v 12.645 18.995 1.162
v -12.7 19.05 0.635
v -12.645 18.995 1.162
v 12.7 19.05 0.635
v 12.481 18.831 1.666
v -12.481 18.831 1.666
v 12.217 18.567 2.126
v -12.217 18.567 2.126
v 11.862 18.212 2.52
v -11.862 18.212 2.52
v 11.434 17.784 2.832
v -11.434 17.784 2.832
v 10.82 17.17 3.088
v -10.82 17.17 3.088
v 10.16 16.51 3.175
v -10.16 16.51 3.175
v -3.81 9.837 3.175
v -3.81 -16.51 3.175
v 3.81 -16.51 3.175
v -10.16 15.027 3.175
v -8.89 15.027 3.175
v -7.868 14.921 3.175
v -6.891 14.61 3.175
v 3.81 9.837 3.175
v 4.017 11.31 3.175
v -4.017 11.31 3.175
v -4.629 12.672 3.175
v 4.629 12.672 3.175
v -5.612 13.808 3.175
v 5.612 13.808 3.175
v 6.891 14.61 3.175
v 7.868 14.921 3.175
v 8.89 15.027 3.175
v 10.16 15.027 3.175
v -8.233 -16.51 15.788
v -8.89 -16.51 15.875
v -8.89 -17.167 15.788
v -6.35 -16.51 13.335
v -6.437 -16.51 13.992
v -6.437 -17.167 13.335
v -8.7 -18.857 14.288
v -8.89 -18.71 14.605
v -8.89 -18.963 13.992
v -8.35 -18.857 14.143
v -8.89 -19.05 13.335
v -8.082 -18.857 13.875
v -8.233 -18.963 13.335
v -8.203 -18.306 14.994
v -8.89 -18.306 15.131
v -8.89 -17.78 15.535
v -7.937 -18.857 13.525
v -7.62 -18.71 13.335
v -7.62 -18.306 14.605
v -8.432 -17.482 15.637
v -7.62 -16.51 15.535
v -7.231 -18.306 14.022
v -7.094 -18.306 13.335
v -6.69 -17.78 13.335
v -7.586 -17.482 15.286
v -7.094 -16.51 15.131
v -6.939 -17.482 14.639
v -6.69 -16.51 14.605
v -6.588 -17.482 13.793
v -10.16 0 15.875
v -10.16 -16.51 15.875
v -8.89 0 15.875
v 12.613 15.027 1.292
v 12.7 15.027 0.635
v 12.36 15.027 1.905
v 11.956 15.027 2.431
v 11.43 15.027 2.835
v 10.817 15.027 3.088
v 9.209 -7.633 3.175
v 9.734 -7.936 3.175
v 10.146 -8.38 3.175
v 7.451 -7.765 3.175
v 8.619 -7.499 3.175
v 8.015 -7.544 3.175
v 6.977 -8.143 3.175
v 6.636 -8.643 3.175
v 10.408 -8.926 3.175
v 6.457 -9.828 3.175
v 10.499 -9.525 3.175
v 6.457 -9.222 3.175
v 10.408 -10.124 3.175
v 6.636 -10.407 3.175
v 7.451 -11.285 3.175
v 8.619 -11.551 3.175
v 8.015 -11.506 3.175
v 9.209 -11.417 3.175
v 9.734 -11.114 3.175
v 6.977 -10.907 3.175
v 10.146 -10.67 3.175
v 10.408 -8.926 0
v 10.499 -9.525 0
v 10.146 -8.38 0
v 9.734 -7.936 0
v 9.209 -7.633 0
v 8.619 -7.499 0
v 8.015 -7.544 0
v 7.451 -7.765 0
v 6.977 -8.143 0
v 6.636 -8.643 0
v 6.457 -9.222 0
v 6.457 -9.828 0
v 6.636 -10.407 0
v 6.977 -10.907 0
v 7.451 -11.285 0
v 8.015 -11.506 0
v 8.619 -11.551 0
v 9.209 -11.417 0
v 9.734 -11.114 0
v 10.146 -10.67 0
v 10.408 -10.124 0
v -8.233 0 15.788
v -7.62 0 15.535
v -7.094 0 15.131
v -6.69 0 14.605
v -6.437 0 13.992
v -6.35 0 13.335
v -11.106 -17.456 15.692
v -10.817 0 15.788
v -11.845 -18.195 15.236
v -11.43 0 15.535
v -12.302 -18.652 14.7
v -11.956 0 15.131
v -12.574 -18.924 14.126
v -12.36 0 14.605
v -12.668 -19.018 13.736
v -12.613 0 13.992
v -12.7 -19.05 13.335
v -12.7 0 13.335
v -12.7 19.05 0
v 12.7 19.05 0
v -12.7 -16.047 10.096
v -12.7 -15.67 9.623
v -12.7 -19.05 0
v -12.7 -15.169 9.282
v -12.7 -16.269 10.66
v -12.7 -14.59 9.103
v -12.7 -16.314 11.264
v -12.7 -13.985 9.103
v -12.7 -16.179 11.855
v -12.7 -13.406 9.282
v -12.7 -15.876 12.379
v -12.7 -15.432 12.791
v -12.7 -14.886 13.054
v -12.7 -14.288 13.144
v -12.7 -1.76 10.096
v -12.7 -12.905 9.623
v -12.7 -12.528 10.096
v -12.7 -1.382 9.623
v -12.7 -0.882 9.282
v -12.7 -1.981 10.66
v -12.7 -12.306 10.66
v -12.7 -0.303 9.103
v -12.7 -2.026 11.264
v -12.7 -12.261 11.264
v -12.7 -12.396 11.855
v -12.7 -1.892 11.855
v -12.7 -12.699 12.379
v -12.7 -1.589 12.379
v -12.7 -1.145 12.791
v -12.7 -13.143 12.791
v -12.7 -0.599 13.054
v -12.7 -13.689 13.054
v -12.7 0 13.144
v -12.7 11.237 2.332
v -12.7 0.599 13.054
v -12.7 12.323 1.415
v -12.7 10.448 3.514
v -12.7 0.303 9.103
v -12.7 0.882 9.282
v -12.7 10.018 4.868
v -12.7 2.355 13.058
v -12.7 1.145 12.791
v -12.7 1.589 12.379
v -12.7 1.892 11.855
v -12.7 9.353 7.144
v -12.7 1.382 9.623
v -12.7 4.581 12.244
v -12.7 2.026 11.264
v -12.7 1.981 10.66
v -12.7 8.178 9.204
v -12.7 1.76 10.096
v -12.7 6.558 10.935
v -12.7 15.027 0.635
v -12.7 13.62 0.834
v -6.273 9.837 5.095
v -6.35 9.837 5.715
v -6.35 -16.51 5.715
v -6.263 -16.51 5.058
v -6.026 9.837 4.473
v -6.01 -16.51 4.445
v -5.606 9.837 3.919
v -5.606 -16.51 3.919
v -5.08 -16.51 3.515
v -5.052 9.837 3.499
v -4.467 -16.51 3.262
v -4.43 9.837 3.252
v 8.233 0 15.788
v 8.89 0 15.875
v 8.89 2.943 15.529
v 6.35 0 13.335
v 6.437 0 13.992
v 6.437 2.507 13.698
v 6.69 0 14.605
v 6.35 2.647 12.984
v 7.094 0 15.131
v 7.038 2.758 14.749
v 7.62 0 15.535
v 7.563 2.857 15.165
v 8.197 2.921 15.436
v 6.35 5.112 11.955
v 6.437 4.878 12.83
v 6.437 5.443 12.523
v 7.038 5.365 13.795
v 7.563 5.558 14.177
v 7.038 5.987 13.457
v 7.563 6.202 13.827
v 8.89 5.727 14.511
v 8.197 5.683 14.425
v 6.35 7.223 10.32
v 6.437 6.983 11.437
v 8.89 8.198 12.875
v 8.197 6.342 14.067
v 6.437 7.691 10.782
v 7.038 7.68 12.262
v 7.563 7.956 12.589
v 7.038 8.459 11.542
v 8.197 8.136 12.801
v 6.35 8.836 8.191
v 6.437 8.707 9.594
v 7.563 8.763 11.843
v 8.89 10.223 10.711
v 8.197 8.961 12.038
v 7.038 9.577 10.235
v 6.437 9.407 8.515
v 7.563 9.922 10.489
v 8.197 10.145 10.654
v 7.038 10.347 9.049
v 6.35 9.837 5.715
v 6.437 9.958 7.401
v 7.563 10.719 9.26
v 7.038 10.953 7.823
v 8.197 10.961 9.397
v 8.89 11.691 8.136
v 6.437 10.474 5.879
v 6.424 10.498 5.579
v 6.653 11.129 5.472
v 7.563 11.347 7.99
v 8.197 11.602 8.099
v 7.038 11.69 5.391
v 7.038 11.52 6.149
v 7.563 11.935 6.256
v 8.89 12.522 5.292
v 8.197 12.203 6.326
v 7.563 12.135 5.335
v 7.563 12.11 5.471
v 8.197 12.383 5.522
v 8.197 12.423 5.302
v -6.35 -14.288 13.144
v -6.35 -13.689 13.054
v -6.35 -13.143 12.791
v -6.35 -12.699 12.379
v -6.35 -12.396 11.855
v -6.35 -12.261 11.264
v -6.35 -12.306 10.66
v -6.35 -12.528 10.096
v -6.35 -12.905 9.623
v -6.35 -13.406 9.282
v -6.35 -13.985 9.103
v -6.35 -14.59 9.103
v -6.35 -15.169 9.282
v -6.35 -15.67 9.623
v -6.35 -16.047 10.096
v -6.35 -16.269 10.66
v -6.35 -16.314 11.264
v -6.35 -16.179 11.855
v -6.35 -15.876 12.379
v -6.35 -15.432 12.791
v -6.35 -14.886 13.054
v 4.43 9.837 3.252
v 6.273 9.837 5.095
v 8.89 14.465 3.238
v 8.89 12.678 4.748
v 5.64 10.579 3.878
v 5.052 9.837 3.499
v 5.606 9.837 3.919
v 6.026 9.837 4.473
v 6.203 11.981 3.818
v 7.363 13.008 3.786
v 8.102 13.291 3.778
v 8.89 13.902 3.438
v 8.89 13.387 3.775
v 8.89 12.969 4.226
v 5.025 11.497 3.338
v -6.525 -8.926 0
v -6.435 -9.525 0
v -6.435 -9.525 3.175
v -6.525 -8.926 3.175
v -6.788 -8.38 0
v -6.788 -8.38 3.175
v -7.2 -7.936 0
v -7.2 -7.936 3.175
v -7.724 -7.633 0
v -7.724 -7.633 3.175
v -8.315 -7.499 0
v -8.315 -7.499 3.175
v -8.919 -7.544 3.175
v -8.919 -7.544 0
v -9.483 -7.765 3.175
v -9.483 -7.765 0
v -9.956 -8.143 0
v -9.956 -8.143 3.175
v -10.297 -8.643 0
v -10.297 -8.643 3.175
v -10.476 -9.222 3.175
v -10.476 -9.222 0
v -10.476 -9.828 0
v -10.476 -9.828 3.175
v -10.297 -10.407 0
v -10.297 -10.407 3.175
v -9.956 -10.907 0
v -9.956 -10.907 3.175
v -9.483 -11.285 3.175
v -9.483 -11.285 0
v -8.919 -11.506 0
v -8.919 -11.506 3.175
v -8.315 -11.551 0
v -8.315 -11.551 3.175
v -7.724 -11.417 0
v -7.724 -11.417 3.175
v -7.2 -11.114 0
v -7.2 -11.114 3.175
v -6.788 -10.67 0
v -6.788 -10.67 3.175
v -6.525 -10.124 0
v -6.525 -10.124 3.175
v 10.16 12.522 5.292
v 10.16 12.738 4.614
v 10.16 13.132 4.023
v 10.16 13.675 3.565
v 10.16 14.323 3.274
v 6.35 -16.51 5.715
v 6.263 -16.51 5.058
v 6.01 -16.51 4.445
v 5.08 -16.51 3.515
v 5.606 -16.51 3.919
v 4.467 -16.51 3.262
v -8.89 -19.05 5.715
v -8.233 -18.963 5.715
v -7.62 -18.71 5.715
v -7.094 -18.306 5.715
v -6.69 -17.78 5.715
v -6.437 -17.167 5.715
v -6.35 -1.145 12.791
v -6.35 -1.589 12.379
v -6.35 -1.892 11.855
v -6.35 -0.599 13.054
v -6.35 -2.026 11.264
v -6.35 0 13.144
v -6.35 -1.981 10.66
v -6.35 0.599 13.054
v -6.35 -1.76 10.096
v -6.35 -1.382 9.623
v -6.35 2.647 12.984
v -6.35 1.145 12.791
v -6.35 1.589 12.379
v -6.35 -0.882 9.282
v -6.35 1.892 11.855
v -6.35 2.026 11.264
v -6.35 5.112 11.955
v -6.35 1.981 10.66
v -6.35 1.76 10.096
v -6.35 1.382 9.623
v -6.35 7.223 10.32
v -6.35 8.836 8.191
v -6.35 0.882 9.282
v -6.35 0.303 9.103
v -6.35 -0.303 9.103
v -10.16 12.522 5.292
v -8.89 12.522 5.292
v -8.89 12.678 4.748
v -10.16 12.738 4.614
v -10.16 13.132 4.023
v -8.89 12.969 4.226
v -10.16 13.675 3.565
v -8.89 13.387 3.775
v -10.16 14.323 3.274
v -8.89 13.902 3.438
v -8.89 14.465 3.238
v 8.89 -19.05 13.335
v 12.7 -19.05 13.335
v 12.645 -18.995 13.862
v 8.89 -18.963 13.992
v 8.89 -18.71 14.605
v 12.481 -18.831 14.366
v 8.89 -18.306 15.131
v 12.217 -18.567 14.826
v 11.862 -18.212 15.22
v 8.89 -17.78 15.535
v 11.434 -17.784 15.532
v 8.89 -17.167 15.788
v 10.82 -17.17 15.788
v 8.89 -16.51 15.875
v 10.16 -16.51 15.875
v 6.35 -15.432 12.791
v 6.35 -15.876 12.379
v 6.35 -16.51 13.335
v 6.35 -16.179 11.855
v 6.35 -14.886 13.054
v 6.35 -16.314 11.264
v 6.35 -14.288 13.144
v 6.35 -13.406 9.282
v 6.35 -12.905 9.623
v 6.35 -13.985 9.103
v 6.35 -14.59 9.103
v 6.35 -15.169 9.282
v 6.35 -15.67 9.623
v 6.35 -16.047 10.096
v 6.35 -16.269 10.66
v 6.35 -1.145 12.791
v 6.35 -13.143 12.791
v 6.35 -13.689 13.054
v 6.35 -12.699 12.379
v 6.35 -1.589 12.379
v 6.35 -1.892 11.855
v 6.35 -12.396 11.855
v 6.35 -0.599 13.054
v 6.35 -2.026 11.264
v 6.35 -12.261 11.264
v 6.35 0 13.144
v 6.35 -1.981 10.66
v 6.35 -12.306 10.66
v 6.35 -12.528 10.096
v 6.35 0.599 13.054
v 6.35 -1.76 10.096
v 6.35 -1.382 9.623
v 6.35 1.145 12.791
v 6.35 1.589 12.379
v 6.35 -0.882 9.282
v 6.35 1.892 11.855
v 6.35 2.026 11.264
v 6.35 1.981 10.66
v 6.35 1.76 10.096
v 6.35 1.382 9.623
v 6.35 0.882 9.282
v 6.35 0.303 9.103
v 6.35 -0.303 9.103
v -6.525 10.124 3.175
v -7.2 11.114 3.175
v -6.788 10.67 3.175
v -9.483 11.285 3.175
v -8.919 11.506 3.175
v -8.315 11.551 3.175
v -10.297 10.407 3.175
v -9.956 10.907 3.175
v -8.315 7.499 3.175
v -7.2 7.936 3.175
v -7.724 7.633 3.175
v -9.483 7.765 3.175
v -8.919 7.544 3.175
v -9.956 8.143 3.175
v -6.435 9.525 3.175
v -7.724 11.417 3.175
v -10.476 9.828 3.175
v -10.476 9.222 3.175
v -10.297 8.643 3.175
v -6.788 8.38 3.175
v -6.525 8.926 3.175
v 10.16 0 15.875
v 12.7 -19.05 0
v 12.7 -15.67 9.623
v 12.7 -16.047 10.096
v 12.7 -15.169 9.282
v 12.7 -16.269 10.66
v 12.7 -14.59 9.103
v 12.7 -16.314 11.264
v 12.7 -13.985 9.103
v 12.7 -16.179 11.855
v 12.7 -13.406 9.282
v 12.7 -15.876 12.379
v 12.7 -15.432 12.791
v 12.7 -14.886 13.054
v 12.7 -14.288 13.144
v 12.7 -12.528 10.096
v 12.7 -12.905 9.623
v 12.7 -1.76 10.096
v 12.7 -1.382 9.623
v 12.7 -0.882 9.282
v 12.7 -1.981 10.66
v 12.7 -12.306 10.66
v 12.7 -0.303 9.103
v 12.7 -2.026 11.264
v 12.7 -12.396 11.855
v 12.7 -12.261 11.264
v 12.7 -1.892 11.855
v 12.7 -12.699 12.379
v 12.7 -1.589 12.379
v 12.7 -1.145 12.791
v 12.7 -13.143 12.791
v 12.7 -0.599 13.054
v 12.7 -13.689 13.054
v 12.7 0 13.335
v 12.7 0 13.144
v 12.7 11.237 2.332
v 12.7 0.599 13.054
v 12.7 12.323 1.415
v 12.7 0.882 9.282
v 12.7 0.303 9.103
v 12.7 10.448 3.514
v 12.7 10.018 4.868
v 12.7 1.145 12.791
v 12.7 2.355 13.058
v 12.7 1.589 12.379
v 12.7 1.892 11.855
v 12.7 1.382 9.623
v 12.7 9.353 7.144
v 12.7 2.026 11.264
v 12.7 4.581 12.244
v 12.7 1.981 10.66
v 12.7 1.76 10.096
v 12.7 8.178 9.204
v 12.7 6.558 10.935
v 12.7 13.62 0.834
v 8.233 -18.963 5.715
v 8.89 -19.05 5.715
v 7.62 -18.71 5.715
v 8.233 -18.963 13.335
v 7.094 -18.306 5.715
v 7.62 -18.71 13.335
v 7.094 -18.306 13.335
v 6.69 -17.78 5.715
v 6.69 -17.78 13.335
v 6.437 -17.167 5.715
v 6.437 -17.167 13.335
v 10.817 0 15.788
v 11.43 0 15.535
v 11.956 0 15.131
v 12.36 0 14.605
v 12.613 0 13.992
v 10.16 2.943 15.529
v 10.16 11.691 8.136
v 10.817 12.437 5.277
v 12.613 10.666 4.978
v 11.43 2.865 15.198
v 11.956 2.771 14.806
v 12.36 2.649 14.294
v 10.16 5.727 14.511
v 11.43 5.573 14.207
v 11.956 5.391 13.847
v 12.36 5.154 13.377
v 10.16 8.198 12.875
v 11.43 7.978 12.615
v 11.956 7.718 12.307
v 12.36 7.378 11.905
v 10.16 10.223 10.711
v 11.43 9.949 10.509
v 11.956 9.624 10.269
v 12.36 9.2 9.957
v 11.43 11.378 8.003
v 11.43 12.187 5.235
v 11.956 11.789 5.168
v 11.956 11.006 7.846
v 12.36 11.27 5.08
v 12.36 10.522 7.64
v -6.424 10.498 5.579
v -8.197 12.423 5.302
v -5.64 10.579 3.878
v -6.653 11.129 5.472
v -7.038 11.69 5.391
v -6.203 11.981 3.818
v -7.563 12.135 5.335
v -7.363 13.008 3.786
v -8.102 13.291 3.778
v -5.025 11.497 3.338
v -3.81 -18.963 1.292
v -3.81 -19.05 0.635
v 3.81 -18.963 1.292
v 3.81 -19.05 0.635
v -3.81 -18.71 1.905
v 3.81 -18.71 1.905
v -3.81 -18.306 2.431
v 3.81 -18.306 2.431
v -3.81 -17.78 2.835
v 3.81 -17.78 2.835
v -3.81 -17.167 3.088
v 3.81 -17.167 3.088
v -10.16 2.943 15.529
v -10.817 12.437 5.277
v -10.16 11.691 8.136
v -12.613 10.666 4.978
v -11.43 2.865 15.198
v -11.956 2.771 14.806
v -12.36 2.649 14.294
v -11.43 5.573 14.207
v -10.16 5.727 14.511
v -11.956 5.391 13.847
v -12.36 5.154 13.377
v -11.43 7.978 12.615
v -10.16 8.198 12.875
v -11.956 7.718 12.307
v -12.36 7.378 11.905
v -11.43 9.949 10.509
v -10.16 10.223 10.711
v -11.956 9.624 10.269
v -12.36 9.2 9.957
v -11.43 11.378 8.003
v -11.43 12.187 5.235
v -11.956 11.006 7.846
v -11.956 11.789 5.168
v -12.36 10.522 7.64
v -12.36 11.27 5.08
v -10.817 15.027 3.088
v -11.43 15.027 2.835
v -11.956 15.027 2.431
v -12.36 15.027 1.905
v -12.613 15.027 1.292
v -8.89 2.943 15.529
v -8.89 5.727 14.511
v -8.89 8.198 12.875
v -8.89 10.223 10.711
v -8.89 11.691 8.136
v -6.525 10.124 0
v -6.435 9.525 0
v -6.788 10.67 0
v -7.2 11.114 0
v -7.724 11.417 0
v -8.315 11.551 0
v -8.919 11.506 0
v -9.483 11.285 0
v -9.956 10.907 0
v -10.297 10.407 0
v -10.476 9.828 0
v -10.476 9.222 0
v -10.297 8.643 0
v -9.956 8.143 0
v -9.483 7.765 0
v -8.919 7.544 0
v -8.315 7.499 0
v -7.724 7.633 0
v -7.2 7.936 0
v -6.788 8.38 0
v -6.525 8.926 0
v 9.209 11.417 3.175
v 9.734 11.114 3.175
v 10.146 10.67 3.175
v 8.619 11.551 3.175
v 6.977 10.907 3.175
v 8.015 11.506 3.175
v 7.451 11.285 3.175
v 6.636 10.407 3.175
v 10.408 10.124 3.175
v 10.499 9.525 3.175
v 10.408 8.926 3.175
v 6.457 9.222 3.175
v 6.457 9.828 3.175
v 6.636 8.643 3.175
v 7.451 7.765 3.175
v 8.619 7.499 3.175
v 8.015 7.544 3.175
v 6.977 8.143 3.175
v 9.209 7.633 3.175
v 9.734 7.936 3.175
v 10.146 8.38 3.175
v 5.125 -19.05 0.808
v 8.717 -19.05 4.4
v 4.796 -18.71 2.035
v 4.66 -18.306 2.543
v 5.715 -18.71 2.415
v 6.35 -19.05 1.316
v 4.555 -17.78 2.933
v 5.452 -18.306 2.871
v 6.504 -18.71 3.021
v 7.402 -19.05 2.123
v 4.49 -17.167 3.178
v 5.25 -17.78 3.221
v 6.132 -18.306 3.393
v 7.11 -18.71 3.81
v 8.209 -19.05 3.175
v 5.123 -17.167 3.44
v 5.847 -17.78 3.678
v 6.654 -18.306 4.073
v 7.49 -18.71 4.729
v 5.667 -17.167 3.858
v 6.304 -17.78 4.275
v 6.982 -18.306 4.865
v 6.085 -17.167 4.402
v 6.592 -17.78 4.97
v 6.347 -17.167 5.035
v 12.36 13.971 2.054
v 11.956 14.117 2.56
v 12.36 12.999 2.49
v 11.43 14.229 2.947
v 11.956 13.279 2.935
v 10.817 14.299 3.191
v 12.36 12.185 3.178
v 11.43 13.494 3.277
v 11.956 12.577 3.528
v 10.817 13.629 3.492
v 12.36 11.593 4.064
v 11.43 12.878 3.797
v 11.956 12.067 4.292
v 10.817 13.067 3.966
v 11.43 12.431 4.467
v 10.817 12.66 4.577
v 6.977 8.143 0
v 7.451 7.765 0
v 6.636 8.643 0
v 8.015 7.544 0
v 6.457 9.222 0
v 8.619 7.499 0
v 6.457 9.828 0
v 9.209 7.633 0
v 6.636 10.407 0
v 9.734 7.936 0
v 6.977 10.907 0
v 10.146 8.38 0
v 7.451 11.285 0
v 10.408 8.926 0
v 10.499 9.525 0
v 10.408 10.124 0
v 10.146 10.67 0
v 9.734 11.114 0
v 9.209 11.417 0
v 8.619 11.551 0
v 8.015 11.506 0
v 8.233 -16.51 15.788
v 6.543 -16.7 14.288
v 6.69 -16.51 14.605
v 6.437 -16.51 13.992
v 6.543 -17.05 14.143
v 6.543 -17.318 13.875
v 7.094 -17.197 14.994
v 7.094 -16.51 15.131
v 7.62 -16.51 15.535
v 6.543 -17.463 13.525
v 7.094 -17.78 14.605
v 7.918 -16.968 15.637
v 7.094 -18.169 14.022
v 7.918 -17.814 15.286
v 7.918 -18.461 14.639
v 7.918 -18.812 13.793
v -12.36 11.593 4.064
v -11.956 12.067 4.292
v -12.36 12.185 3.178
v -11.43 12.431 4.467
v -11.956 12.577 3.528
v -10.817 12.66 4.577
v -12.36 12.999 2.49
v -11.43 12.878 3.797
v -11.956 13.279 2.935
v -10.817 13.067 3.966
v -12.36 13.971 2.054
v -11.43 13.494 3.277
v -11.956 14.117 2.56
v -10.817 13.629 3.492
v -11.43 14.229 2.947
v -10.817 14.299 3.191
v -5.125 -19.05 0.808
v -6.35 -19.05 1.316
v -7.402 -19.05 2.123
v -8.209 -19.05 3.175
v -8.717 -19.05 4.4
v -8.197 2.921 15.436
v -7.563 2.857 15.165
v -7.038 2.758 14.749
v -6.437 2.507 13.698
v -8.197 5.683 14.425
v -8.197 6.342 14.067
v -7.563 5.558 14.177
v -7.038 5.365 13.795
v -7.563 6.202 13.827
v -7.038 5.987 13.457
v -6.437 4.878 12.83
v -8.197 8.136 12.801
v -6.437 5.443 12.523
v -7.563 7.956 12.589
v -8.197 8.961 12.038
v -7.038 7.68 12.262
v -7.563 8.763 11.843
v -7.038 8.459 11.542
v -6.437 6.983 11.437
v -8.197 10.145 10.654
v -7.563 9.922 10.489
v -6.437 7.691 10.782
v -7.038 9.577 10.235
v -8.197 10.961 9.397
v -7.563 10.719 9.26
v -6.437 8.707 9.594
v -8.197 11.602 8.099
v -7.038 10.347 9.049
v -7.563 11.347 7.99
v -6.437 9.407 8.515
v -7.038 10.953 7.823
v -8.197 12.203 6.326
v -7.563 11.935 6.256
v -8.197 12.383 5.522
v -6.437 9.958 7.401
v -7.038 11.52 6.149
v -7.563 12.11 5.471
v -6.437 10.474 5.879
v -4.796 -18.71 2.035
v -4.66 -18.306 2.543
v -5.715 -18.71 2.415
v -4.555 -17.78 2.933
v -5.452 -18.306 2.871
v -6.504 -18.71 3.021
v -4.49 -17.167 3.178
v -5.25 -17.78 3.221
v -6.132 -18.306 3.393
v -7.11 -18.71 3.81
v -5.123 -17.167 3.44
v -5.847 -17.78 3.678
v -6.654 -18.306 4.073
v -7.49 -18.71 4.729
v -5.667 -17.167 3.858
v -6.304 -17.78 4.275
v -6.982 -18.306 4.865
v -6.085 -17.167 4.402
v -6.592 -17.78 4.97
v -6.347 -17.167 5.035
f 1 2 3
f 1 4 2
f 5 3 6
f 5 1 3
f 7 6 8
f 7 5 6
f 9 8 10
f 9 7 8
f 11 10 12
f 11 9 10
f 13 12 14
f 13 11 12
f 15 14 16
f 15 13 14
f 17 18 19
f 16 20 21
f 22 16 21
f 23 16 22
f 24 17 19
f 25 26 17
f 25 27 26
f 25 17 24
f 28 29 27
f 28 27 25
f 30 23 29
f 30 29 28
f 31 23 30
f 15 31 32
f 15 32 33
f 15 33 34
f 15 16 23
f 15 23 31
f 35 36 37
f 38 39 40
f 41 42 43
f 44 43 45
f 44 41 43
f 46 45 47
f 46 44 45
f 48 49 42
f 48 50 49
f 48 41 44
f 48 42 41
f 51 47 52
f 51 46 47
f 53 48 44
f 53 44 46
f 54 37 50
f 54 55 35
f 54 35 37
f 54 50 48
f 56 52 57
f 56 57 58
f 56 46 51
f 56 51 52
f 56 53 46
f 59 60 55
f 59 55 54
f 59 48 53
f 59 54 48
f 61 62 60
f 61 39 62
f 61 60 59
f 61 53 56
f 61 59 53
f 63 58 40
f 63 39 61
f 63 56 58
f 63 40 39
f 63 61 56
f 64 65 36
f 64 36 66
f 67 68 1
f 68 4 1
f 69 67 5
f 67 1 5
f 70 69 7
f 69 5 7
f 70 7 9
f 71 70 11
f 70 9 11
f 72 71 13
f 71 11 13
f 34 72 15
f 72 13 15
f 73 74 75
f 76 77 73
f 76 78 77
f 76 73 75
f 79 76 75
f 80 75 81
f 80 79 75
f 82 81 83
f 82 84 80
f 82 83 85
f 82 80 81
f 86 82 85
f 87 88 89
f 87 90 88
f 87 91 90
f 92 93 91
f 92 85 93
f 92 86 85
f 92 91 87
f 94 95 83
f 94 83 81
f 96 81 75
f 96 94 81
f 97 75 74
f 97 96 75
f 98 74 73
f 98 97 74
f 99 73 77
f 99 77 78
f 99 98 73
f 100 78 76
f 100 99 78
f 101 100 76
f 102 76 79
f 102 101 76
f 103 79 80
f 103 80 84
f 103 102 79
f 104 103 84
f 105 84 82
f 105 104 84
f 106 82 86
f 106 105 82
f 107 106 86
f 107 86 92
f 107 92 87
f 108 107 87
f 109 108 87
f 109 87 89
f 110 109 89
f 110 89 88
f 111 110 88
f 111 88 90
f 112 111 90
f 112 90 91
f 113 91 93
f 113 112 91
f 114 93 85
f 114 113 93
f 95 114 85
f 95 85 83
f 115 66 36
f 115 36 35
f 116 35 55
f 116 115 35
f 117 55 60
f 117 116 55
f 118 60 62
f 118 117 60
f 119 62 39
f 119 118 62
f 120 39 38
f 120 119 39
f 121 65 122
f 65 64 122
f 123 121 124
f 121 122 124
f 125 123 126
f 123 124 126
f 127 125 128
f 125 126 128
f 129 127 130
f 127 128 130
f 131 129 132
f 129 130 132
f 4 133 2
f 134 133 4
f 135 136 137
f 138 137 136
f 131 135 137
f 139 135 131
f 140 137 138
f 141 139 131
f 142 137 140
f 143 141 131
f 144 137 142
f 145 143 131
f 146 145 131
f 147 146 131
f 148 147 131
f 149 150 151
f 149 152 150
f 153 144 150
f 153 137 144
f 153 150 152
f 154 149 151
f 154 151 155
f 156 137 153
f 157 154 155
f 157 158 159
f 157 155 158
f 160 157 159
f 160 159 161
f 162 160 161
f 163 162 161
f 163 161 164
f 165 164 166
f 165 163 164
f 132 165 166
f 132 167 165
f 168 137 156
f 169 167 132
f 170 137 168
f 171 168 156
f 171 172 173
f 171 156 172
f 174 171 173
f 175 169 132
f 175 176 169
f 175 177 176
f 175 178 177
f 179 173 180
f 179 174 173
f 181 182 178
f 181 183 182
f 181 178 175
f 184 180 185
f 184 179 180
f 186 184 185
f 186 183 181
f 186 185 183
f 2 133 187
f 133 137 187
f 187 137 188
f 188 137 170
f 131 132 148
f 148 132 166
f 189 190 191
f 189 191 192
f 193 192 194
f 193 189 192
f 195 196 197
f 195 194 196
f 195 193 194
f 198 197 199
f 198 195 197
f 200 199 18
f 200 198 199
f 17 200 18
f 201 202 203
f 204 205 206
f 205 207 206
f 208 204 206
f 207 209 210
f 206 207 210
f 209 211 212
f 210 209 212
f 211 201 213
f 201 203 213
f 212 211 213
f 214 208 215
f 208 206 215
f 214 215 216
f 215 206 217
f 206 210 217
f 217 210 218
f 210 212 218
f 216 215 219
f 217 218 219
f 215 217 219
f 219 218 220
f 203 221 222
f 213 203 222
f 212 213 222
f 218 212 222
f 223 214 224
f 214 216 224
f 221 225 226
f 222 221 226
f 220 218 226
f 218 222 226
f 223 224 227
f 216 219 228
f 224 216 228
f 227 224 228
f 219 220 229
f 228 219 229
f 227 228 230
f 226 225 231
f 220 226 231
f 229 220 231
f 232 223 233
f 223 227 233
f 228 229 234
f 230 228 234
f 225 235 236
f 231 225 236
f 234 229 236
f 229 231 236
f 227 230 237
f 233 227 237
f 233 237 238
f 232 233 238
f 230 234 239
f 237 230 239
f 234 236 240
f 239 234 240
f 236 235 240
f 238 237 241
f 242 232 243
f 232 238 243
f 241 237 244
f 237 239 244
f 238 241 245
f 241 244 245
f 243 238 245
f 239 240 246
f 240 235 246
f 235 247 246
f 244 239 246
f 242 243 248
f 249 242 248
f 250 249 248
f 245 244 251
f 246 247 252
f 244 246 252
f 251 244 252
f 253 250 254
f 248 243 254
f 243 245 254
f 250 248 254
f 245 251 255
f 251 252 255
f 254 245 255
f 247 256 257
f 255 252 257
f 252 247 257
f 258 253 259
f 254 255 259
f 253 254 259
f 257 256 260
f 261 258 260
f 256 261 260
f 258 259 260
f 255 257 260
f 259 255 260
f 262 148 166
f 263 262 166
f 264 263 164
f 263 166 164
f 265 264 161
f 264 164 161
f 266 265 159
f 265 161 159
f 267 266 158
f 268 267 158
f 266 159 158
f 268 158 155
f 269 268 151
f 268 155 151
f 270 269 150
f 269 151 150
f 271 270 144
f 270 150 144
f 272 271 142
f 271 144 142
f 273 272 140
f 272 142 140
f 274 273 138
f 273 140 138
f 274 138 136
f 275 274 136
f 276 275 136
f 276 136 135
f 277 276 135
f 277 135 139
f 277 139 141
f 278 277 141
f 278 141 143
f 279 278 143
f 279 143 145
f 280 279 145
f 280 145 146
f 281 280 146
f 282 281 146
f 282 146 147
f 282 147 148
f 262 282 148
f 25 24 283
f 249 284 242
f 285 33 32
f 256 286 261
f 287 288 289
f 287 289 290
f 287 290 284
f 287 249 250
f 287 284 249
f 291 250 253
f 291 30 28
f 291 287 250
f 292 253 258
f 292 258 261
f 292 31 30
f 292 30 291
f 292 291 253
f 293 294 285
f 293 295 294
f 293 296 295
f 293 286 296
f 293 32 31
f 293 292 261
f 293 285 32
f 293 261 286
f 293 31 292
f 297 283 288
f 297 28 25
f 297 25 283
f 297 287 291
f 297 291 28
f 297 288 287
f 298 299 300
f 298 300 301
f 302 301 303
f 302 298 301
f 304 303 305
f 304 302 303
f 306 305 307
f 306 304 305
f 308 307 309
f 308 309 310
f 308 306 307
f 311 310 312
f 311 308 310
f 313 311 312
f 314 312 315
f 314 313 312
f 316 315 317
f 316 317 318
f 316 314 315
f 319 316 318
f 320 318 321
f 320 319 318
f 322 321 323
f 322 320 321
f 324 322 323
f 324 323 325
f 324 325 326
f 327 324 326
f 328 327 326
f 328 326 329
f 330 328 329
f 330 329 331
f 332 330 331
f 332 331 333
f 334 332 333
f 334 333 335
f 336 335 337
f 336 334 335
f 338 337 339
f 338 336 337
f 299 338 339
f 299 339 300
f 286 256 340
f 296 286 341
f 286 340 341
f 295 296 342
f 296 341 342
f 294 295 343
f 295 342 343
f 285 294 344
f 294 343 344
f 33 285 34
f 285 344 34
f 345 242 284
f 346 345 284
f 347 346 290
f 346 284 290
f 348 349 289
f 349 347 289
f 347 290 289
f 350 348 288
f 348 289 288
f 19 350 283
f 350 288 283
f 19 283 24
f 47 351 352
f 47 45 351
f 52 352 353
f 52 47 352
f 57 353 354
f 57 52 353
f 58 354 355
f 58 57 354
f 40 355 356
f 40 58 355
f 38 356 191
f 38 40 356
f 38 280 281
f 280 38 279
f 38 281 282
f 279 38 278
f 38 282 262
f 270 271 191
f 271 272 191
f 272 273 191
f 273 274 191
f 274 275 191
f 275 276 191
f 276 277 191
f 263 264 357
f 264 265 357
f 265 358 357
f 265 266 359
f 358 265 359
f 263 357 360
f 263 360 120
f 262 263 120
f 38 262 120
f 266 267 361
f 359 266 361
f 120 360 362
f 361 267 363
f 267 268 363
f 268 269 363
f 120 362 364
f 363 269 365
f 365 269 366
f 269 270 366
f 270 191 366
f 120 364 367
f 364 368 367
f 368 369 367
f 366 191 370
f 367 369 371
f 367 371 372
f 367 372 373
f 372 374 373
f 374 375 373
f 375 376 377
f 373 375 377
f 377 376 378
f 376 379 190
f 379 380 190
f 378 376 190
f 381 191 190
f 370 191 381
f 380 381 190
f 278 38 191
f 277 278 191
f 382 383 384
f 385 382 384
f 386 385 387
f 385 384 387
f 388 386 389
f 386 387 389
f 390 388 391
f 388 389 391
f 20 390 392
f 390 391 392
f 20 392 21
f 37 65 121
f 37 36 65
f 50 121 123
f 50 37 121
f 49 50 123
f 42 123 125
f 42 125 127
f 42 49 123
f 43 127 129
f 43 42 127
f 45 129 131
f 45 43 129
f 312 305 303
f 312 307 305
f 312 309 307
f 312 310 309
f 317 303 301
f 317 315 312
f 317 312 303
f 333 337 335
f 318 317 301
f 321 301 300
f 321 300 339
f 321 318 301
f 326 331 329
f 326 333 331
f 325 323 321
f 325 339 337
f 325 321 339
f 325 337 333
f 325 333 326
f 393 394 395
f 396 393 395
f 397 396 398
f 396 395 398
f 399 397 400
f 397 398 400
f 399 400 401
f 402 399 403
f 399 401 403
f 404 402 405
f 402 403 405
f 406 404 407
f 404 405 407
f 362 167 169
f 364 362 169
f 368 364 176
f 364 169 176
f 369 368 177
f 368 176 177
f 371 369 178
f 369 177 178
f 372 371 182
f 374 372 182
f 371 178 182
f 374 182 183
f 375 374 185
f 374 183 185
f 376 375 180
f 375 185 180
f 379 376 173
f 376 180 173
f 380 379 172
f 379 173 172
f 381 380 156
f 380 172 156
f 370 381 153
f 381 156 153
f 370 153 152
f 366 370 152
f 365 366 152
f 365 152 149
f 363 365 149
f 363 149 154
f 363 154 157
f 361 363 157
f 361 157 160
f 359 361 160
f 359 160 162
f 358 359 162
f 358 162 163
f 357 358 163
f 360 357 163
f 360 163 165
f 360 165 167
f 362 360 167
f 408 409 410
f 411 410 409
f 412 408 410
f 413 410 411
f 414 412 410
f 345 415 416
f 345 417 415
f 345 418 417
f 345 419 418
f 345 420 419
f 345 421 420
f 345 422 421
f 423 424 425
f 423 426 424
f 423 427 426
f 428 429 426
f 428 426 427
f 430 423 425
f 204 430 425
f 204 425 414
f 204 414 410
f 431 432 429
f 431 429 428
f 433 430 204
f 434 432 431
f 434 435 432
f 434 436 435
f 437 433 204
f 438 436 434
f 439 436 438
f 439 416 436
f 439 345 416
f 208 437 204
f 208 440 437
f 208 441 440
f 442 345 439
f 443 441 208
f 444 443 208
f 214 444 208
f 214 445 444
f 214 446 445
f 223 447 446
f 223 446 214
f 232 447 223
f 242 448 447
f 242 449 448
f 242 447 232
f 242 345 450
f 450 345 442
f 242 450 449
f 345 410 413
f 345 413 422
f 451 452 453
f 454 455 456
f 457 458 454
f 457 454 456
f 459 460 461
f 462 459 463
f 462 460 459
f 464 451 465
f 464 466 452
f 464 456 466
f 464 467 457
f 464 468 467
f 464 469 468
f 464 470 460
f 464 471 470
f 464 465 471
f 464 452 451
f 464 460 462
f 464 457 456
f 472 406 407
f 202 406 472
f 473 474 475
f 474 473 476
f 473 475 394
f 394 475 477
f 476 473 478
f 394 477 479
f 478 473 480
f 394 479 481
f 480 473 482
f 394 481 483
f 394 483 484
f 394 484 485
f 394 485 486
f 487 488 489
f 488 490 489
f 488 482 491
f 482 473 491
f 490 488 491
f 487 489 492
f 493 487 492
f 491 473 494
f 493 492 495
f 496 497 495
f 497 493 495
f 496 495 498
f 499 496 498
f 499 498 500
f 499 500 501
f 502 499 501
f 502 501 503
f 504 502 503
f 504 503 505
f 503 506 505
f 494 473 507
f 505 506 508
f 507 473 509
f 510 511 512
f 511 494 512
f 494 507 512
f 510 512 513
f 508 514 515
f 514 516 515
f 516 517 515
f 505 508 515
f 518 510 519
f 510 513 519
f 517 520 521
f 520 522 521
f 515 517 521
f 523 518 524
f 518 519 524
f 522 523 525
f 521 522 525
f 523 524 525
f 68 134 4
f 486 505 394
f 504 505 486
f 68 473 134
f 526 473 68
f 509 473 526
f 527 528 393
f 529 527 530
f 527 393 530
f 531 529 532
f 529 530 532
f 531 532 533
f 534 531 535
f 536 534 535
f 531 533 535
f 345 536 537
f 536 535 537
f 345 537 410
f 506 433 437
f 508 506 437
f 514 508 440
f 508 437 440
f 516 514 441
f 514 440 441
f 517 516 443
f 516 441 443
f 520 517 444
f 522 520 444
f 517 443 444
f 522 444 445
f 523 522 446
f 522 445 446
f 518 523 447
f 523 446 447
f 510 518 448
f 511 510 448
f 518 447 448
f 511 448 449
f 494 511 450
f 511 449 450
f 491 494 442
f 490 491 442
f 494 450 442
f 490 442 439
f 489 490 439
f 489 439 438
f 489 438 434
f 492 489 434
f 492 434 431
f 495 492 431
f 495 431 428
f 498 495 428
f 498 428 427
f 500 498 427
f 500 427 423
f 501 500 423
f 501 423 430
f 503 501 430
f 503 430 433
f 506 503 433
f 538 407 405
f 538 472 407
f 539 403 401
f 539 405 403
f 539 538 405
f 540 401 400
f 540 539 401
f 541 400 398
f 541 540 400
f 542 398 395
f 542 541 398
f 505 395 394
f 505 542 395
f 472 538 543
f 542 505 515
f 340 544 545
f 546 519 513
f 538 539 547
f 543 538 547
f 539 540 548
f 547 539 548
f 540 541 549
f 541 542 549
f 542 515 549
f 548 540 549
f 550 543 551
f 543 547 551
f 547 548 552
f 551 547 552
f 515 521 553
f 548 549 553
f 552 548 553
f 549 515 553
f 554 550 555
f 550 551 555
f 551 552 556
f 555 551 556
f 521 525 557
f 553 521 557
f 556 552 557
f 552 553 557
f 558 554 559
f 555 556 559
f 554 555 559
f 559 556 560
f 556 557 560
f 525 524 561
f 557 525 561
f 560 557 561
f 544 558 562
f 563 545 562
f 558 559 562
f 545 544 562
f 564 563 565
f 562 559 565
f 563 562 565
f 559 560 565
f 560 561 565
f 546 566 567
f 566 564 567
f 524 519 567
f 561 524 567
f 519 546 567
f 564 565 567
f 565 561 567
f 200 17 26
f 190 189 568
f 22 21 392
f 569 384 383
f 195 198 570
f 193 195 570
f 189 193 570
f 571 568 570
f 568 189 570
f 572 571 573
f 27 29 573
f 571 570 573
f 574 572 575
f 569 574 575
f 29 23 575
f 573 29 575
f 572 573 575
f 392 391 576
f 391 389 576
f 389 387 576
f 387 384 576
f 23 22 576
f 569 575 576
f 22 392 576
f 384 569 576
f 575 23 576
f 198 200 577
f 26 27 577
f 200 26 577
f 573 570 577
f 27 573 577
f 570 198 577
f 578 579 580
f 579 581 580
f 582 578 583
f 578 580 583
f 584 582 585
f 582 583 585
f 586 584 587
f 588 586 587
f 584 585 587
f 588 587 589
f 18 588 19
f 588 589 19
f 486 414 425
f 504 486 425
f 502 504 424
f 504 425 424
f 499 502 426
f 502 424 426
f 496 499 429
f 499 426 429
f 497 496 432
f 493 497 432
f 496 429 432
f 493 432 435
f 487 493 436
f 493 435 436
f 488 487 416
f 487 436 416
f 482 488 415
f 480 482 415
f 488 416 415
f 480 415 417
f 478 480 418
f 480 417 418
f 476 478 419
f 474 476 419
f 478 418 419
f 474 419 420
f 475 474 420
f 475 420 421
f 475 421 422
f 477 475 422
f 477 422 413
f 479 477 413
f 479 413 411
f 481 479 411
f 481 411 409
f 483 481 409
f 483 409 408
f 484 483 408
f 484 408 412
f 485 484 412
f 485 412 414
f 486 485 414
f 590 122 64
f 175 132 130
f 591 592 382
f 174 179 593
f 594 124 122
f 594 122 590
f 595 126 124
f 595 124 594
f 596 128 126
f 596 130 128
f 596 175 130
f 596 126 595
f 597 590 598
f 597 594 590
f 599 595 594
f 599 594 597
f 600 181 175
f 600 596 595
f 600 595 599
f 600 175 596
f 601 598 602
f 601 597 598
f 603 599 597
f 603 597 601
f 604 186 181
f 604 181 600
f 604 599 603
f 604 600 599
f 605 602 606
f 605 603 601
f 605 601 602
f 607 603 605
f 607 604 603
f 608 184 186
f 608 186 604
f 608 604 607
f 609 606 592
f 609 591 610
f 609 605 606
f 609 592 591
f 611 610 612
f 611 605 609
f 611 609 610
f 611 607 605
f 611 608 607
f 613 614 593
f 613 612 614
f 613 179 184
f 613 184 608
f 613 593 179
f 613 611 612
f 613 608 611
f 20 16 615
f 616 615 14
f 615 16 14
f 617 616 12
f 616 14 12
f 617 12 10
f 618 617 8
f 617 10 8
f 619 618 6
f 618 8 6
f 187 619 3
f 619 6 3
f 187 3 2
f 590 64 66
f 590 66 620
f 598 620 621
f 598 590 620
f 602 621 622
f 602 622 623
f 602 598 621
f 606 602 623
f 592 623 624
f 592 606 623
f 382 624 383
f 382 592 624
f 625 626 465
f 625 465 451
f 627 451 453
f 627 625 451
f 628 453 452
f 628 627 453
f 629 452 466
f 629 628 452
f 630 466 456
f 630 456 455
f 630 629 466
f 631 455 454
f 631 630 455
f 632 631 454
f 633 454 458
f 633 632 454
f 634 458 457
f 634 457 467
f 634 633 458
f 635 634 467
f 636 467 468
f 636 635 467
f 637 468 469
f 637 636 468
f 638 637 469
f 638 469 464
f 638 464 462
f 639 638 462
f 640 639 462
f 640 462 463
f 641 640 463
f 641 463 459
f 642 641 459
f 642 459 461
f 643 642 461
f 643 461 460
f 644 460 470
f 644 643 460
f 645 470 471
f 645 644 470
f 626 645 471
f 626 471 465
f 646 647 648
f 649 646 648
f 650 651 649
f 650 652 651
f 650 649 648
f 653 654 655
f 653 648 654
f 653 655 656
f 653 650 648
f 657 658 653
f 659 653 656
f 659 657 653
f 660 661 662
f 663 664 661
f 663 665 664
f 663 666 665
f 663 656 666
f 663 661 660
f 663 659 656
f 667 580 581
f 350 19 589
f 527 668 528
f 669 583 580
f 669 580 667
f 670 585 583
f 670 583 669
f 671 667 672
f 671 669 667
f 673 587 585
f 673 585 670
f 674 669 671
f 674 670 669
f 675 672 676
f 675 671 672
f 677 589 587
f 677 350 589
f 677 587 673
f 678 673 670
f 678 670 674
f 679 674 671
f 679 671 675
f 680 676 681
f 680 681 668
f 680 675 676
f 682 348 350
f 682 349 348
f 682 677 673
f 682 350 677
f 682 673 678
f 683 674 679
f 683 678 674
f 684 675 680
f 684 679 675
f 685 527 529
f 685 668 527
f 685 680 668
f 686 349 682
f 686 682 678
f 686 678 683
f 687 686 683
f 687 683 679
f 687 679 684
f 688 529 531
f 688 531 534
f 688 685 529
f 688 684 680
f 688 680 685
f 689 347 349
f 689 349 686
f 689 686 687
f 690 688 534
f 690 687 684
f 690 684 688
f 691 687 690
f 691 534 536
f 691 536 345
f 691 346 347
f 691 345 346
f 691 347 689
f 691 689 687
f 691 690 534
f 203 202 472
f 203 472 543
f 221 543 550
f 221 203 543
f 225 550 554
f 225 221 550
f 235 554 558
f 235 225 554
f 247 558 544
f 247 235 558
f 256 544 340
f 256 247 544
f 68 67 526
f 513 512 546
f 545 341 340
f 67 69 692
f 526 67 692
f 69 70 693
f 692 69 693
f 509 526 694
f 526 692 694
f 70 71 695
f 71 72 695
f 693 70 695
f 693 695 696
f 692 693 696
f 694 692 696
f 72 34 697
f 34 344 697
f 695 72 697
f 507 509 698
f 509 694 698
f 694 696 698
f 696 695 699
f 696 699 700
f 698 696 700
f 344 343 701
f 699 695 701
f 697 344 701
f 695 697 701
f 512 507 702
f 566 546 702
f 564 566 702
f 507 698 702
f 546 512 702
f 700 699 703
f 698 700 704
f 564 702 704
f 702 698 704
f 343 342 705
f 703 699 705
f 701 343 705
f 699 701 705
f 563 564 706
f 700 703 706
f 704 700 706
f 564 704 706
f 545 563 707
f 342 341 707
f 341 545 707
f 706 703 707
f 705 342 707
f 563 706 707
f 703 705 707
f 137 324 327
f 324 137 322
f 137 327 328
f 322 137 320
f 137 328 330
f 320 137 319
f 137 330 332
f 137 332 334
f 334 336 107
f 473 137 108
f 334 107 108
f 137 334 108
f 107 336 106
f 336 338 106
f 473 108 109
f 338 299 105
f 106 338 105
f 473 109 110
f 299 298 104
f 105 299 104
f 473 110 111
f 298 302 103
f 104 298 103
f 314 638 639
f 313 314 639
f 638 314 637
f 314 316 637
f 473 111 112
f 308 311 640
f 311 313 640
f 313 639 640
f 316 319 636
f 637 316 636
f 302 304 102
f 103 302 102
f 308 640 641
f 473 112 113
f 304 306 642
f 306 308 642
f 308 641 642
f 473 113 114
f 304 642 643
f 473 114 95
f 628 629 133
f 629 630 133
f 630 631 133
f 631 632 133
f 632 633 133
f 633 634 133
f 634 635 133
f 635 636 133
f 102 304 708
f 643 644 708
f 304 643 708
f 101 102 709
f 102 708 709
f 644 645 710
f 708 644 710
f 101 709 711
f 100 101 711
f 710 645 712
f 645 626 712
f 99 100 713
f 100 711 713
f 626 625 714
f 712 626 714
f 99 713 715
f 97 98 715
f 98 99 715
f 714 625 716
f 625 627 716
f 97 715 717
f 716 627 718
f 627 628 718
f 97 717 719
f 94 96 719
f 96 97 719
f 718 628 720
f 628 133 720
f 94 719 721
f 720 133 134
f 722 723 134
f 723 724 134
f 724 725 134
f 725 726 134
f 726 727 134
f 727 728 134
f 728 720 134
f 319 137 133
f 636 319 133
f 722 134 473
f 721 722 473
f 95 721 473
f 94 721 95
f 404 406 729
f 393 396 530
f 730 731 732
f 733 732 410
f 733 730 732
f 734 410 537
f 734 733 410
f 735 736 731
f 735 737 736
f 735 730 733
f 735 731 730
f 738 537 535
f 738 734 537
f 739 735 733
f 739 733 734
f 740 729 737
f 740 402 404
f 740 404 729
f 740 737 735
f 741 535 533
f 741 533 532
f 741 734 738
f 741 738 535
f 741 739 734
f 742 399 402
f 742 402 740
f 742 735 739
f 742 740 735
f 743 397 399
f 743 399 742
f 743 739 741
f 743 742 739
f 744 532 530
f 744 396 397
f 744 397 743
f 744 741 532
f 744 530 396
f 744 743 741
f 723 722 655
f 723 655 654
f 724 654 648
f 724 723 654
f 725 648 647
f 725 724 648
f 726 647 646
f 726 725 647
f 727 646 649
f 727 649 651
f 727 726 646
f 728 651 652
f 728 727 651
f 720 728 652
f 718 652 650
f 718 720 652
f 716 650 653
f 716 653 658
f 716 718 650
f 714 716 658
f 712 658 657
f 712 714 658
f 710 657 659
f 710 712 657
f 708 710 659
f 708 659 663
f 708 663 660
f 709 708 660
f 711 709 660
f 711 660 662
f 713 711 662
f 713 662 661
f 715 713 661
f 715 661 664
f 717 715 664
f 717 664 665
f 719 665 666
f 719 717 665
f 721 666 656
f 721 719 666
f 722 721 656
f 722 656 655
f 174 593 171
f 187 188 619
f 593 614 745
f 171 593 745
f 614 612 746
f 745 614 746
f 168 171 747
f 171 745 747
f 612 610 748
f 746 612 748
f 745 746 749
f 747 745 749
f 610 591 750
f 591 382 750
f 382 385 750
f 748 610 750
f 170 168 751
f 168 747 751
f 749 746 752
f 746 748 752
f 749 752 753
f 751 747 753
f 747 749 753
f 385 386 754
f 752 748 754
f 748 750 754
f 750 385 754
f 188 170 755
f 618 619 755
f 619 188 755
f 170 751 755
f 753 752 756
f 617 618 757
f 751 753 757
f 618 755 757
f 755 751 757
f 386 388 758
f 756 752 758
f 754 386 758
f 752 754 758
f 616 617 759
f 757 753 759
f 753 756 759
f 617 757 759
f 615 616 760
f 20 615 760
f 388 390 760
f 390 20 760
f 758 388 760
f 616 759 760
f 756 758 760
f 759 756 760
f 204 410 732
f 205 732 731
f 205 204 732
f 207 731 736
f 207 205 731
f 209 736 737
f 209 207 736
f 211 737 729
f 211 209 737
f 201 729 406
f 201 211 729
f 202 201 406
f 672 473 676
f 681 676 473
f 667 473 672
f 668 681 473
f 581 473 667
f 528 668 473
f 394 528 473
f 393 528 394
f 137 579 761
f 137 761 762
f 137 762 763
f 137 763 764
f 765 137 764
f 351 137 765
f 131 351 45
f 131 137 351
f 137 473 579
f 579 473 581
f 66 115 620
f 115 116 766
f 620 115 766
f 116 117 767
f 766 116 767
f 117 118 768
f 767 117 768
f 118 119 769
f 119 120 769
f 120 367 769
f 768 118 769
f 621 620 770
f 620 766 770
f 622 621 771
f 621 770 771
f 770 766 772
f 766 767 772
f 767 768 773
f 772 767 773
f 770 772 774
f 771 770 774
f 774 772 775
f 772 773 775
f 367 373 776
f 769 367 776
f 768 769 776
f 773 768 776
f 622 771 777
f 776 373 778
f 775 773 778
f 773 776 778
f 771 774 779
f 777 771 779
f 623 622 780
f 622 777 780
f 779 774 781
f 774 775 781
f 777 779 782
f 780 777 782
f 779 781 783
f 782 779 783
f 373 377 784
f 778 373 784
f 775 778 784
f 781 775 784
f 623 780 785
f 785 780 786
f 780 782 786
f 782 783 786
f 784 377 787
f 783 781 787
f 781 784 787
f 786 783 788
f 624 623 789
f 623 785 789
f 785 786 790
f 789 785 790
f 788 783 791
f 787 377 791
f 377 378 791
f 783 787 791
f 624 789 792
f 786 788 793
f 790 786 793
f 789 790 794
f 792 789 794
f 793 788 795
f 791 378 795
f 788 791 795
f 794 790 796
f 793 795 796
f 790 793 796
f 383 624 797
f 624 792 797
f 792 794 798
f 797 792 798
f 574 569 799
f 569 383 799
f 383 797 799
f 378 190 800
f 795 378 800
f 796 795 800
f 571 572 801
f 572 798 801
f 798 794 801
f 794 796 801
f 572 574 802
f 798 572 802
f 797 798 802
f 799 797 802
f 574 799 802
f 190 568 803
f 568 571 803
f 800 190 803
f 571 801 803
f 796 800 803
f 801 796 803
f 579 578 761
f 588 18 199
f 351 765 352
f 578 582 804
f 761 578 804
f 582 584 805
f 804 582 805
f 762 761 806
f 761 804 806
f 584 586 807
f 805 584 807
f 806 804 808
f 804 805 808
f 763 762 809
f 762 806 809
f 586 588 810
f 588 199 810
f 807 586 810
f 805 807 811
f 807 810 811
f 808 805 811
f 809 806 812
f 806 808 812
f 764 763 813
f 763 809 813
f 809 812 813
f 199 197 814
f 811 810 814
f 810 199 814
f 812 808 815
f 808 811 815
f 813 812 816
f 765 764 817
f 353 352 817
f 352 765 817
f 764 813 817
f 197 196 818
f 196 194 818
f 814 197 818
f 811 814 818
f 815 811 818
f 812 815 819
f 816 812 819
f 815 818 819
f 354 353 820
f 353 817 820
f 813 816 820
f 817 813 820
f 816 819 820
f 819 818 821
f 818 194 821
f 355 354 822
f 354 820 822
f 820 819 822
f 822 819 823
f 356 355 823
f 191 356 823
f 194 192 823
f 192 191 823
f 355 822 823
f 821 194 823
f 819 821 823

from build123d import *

# Parameters (mm, degrees)
SKETCH1_W           = 25.4
SKETCH1_H           = 38.1
SKETCH1_R           = 2.032
BOSS_EXTRUDE1_DEPTH = 3.175
SKETCH2_R           = 2.032
BOSS_EXTRUDE2_DEPTH = 25.4
SKETCH3_W           = 12.7
SKETCH3_H           = 31.75
SKETCH3_W_2         = 3.175
CUT_EXTRUDE1_DEPTH  = 27.181720723
FILLET1_R           = 2.54


with BuildPart() as part:
    # Sketch1 → Boss-Extrude1 (new body)
    with BuildSketch(Plane.XY):
        Rectangle(SKETCH1_W, SKETCH1_H)
        with Locations((-8.466666667, 9.525)):
            Circle(SKETCH1_R, mode=Mode.SUBTRACT)
        with Locations((8.466666667, 9.525)):
            Circle(SKETCH1_R, mode=Mode.SUBTRACT)
        with Locations((-8.466666667, -9.525)):
            Circle(SKETCH1_R, mode=Mode.SUBTRACT)
        with Locations((8.466666667, -9.525)):
            Circle(SKETCH1_R, mode=Mode.SUBTRACT)
    extrude(amount=BOSS_EXTRUDE1_DEPTH)

    # Sketch2 → Boss-Extrude2 (add)
    with BuildSketch(Plane.ZY.offset(12.7)):
        with BuildLine():
            ThreePointArc((15.875, 0), (12.155256121, 8.980256121), (3.175, 12.7))
            Line((3.175, 12.7), (3.175, -19.05))
            Line((3.175, -19.05), (15.875, -19.05))
            Line((15.875, -19.05), (15.875, 0))
        make_face()
        with Locations((11.1125, 0)):
            Circle(SKETCH2_R, mode=Mode.SUBTRACT)
        with Locations((11.1125, -14.2875)):
            Circle(SKETCH2_R, mode=Mode.SUBTRACT)
    extrude(amount=-BOSS_EXTRUDE2_DEPTH)

    # Sketch3 → Cut-Extrude1 (cut, through all)
    with BuildSketch(Plane.XY.offset(3.175)):
        with Locations((0, -3.175)):
            Rectangle(SKETCH3_W, SKETCH3_H)
        with Locations((-14.2875, -3.175)):
            Rectangle(SKETCH3_W_2, SKETCH3_H)
        with Locations((14.2875, -3.175)):
            Rectangle(SKETCH3_W_2, SKETCH3_H)
    extrude(amount=CUT_EXTRUDE1_DEPTH, mode=Mode.SUBTRACT)

    # Fillet1
    fillet1_edges = [part.edges().sort_by_distance(p)[0] for p in [
        (0, 19.05, 3.175),
        (12.7, 15.875, 3.175),
        (9.525, -19.05, 15.875),
        (12.7, -9.525, 15.875),
        (-12.7, -9.525, 15.875),
        (12.7, 8.980256121, 12.155256121),
        (9.525, 12.7, 3.175),
        (-12.7, 8.980256121, 12.155256121),
        (-12.7, 15.875, 3.175),
        (-9.525, 12.7, 3.175),
        (6.35, 8.980256121, 12.155256121),
        (-6.35, 8.980256121, 12.155256121),
        (-9.525, -19.05, 15.875),
        (-6.35, -3.175, 3.175),
        (6.35, -19.05, 9.525),
        (6.35, -3.175, 3.175),
        (6.35, -9.525, 15.875),
        (-6.35, -9.525, 15.875),
        (0, -19.05, 3.175),
        (-6.35, -19.05, 9.525),
    ]]
    fillet(fillet1_edges, radius=FILLET1_R)


solid = part.part
